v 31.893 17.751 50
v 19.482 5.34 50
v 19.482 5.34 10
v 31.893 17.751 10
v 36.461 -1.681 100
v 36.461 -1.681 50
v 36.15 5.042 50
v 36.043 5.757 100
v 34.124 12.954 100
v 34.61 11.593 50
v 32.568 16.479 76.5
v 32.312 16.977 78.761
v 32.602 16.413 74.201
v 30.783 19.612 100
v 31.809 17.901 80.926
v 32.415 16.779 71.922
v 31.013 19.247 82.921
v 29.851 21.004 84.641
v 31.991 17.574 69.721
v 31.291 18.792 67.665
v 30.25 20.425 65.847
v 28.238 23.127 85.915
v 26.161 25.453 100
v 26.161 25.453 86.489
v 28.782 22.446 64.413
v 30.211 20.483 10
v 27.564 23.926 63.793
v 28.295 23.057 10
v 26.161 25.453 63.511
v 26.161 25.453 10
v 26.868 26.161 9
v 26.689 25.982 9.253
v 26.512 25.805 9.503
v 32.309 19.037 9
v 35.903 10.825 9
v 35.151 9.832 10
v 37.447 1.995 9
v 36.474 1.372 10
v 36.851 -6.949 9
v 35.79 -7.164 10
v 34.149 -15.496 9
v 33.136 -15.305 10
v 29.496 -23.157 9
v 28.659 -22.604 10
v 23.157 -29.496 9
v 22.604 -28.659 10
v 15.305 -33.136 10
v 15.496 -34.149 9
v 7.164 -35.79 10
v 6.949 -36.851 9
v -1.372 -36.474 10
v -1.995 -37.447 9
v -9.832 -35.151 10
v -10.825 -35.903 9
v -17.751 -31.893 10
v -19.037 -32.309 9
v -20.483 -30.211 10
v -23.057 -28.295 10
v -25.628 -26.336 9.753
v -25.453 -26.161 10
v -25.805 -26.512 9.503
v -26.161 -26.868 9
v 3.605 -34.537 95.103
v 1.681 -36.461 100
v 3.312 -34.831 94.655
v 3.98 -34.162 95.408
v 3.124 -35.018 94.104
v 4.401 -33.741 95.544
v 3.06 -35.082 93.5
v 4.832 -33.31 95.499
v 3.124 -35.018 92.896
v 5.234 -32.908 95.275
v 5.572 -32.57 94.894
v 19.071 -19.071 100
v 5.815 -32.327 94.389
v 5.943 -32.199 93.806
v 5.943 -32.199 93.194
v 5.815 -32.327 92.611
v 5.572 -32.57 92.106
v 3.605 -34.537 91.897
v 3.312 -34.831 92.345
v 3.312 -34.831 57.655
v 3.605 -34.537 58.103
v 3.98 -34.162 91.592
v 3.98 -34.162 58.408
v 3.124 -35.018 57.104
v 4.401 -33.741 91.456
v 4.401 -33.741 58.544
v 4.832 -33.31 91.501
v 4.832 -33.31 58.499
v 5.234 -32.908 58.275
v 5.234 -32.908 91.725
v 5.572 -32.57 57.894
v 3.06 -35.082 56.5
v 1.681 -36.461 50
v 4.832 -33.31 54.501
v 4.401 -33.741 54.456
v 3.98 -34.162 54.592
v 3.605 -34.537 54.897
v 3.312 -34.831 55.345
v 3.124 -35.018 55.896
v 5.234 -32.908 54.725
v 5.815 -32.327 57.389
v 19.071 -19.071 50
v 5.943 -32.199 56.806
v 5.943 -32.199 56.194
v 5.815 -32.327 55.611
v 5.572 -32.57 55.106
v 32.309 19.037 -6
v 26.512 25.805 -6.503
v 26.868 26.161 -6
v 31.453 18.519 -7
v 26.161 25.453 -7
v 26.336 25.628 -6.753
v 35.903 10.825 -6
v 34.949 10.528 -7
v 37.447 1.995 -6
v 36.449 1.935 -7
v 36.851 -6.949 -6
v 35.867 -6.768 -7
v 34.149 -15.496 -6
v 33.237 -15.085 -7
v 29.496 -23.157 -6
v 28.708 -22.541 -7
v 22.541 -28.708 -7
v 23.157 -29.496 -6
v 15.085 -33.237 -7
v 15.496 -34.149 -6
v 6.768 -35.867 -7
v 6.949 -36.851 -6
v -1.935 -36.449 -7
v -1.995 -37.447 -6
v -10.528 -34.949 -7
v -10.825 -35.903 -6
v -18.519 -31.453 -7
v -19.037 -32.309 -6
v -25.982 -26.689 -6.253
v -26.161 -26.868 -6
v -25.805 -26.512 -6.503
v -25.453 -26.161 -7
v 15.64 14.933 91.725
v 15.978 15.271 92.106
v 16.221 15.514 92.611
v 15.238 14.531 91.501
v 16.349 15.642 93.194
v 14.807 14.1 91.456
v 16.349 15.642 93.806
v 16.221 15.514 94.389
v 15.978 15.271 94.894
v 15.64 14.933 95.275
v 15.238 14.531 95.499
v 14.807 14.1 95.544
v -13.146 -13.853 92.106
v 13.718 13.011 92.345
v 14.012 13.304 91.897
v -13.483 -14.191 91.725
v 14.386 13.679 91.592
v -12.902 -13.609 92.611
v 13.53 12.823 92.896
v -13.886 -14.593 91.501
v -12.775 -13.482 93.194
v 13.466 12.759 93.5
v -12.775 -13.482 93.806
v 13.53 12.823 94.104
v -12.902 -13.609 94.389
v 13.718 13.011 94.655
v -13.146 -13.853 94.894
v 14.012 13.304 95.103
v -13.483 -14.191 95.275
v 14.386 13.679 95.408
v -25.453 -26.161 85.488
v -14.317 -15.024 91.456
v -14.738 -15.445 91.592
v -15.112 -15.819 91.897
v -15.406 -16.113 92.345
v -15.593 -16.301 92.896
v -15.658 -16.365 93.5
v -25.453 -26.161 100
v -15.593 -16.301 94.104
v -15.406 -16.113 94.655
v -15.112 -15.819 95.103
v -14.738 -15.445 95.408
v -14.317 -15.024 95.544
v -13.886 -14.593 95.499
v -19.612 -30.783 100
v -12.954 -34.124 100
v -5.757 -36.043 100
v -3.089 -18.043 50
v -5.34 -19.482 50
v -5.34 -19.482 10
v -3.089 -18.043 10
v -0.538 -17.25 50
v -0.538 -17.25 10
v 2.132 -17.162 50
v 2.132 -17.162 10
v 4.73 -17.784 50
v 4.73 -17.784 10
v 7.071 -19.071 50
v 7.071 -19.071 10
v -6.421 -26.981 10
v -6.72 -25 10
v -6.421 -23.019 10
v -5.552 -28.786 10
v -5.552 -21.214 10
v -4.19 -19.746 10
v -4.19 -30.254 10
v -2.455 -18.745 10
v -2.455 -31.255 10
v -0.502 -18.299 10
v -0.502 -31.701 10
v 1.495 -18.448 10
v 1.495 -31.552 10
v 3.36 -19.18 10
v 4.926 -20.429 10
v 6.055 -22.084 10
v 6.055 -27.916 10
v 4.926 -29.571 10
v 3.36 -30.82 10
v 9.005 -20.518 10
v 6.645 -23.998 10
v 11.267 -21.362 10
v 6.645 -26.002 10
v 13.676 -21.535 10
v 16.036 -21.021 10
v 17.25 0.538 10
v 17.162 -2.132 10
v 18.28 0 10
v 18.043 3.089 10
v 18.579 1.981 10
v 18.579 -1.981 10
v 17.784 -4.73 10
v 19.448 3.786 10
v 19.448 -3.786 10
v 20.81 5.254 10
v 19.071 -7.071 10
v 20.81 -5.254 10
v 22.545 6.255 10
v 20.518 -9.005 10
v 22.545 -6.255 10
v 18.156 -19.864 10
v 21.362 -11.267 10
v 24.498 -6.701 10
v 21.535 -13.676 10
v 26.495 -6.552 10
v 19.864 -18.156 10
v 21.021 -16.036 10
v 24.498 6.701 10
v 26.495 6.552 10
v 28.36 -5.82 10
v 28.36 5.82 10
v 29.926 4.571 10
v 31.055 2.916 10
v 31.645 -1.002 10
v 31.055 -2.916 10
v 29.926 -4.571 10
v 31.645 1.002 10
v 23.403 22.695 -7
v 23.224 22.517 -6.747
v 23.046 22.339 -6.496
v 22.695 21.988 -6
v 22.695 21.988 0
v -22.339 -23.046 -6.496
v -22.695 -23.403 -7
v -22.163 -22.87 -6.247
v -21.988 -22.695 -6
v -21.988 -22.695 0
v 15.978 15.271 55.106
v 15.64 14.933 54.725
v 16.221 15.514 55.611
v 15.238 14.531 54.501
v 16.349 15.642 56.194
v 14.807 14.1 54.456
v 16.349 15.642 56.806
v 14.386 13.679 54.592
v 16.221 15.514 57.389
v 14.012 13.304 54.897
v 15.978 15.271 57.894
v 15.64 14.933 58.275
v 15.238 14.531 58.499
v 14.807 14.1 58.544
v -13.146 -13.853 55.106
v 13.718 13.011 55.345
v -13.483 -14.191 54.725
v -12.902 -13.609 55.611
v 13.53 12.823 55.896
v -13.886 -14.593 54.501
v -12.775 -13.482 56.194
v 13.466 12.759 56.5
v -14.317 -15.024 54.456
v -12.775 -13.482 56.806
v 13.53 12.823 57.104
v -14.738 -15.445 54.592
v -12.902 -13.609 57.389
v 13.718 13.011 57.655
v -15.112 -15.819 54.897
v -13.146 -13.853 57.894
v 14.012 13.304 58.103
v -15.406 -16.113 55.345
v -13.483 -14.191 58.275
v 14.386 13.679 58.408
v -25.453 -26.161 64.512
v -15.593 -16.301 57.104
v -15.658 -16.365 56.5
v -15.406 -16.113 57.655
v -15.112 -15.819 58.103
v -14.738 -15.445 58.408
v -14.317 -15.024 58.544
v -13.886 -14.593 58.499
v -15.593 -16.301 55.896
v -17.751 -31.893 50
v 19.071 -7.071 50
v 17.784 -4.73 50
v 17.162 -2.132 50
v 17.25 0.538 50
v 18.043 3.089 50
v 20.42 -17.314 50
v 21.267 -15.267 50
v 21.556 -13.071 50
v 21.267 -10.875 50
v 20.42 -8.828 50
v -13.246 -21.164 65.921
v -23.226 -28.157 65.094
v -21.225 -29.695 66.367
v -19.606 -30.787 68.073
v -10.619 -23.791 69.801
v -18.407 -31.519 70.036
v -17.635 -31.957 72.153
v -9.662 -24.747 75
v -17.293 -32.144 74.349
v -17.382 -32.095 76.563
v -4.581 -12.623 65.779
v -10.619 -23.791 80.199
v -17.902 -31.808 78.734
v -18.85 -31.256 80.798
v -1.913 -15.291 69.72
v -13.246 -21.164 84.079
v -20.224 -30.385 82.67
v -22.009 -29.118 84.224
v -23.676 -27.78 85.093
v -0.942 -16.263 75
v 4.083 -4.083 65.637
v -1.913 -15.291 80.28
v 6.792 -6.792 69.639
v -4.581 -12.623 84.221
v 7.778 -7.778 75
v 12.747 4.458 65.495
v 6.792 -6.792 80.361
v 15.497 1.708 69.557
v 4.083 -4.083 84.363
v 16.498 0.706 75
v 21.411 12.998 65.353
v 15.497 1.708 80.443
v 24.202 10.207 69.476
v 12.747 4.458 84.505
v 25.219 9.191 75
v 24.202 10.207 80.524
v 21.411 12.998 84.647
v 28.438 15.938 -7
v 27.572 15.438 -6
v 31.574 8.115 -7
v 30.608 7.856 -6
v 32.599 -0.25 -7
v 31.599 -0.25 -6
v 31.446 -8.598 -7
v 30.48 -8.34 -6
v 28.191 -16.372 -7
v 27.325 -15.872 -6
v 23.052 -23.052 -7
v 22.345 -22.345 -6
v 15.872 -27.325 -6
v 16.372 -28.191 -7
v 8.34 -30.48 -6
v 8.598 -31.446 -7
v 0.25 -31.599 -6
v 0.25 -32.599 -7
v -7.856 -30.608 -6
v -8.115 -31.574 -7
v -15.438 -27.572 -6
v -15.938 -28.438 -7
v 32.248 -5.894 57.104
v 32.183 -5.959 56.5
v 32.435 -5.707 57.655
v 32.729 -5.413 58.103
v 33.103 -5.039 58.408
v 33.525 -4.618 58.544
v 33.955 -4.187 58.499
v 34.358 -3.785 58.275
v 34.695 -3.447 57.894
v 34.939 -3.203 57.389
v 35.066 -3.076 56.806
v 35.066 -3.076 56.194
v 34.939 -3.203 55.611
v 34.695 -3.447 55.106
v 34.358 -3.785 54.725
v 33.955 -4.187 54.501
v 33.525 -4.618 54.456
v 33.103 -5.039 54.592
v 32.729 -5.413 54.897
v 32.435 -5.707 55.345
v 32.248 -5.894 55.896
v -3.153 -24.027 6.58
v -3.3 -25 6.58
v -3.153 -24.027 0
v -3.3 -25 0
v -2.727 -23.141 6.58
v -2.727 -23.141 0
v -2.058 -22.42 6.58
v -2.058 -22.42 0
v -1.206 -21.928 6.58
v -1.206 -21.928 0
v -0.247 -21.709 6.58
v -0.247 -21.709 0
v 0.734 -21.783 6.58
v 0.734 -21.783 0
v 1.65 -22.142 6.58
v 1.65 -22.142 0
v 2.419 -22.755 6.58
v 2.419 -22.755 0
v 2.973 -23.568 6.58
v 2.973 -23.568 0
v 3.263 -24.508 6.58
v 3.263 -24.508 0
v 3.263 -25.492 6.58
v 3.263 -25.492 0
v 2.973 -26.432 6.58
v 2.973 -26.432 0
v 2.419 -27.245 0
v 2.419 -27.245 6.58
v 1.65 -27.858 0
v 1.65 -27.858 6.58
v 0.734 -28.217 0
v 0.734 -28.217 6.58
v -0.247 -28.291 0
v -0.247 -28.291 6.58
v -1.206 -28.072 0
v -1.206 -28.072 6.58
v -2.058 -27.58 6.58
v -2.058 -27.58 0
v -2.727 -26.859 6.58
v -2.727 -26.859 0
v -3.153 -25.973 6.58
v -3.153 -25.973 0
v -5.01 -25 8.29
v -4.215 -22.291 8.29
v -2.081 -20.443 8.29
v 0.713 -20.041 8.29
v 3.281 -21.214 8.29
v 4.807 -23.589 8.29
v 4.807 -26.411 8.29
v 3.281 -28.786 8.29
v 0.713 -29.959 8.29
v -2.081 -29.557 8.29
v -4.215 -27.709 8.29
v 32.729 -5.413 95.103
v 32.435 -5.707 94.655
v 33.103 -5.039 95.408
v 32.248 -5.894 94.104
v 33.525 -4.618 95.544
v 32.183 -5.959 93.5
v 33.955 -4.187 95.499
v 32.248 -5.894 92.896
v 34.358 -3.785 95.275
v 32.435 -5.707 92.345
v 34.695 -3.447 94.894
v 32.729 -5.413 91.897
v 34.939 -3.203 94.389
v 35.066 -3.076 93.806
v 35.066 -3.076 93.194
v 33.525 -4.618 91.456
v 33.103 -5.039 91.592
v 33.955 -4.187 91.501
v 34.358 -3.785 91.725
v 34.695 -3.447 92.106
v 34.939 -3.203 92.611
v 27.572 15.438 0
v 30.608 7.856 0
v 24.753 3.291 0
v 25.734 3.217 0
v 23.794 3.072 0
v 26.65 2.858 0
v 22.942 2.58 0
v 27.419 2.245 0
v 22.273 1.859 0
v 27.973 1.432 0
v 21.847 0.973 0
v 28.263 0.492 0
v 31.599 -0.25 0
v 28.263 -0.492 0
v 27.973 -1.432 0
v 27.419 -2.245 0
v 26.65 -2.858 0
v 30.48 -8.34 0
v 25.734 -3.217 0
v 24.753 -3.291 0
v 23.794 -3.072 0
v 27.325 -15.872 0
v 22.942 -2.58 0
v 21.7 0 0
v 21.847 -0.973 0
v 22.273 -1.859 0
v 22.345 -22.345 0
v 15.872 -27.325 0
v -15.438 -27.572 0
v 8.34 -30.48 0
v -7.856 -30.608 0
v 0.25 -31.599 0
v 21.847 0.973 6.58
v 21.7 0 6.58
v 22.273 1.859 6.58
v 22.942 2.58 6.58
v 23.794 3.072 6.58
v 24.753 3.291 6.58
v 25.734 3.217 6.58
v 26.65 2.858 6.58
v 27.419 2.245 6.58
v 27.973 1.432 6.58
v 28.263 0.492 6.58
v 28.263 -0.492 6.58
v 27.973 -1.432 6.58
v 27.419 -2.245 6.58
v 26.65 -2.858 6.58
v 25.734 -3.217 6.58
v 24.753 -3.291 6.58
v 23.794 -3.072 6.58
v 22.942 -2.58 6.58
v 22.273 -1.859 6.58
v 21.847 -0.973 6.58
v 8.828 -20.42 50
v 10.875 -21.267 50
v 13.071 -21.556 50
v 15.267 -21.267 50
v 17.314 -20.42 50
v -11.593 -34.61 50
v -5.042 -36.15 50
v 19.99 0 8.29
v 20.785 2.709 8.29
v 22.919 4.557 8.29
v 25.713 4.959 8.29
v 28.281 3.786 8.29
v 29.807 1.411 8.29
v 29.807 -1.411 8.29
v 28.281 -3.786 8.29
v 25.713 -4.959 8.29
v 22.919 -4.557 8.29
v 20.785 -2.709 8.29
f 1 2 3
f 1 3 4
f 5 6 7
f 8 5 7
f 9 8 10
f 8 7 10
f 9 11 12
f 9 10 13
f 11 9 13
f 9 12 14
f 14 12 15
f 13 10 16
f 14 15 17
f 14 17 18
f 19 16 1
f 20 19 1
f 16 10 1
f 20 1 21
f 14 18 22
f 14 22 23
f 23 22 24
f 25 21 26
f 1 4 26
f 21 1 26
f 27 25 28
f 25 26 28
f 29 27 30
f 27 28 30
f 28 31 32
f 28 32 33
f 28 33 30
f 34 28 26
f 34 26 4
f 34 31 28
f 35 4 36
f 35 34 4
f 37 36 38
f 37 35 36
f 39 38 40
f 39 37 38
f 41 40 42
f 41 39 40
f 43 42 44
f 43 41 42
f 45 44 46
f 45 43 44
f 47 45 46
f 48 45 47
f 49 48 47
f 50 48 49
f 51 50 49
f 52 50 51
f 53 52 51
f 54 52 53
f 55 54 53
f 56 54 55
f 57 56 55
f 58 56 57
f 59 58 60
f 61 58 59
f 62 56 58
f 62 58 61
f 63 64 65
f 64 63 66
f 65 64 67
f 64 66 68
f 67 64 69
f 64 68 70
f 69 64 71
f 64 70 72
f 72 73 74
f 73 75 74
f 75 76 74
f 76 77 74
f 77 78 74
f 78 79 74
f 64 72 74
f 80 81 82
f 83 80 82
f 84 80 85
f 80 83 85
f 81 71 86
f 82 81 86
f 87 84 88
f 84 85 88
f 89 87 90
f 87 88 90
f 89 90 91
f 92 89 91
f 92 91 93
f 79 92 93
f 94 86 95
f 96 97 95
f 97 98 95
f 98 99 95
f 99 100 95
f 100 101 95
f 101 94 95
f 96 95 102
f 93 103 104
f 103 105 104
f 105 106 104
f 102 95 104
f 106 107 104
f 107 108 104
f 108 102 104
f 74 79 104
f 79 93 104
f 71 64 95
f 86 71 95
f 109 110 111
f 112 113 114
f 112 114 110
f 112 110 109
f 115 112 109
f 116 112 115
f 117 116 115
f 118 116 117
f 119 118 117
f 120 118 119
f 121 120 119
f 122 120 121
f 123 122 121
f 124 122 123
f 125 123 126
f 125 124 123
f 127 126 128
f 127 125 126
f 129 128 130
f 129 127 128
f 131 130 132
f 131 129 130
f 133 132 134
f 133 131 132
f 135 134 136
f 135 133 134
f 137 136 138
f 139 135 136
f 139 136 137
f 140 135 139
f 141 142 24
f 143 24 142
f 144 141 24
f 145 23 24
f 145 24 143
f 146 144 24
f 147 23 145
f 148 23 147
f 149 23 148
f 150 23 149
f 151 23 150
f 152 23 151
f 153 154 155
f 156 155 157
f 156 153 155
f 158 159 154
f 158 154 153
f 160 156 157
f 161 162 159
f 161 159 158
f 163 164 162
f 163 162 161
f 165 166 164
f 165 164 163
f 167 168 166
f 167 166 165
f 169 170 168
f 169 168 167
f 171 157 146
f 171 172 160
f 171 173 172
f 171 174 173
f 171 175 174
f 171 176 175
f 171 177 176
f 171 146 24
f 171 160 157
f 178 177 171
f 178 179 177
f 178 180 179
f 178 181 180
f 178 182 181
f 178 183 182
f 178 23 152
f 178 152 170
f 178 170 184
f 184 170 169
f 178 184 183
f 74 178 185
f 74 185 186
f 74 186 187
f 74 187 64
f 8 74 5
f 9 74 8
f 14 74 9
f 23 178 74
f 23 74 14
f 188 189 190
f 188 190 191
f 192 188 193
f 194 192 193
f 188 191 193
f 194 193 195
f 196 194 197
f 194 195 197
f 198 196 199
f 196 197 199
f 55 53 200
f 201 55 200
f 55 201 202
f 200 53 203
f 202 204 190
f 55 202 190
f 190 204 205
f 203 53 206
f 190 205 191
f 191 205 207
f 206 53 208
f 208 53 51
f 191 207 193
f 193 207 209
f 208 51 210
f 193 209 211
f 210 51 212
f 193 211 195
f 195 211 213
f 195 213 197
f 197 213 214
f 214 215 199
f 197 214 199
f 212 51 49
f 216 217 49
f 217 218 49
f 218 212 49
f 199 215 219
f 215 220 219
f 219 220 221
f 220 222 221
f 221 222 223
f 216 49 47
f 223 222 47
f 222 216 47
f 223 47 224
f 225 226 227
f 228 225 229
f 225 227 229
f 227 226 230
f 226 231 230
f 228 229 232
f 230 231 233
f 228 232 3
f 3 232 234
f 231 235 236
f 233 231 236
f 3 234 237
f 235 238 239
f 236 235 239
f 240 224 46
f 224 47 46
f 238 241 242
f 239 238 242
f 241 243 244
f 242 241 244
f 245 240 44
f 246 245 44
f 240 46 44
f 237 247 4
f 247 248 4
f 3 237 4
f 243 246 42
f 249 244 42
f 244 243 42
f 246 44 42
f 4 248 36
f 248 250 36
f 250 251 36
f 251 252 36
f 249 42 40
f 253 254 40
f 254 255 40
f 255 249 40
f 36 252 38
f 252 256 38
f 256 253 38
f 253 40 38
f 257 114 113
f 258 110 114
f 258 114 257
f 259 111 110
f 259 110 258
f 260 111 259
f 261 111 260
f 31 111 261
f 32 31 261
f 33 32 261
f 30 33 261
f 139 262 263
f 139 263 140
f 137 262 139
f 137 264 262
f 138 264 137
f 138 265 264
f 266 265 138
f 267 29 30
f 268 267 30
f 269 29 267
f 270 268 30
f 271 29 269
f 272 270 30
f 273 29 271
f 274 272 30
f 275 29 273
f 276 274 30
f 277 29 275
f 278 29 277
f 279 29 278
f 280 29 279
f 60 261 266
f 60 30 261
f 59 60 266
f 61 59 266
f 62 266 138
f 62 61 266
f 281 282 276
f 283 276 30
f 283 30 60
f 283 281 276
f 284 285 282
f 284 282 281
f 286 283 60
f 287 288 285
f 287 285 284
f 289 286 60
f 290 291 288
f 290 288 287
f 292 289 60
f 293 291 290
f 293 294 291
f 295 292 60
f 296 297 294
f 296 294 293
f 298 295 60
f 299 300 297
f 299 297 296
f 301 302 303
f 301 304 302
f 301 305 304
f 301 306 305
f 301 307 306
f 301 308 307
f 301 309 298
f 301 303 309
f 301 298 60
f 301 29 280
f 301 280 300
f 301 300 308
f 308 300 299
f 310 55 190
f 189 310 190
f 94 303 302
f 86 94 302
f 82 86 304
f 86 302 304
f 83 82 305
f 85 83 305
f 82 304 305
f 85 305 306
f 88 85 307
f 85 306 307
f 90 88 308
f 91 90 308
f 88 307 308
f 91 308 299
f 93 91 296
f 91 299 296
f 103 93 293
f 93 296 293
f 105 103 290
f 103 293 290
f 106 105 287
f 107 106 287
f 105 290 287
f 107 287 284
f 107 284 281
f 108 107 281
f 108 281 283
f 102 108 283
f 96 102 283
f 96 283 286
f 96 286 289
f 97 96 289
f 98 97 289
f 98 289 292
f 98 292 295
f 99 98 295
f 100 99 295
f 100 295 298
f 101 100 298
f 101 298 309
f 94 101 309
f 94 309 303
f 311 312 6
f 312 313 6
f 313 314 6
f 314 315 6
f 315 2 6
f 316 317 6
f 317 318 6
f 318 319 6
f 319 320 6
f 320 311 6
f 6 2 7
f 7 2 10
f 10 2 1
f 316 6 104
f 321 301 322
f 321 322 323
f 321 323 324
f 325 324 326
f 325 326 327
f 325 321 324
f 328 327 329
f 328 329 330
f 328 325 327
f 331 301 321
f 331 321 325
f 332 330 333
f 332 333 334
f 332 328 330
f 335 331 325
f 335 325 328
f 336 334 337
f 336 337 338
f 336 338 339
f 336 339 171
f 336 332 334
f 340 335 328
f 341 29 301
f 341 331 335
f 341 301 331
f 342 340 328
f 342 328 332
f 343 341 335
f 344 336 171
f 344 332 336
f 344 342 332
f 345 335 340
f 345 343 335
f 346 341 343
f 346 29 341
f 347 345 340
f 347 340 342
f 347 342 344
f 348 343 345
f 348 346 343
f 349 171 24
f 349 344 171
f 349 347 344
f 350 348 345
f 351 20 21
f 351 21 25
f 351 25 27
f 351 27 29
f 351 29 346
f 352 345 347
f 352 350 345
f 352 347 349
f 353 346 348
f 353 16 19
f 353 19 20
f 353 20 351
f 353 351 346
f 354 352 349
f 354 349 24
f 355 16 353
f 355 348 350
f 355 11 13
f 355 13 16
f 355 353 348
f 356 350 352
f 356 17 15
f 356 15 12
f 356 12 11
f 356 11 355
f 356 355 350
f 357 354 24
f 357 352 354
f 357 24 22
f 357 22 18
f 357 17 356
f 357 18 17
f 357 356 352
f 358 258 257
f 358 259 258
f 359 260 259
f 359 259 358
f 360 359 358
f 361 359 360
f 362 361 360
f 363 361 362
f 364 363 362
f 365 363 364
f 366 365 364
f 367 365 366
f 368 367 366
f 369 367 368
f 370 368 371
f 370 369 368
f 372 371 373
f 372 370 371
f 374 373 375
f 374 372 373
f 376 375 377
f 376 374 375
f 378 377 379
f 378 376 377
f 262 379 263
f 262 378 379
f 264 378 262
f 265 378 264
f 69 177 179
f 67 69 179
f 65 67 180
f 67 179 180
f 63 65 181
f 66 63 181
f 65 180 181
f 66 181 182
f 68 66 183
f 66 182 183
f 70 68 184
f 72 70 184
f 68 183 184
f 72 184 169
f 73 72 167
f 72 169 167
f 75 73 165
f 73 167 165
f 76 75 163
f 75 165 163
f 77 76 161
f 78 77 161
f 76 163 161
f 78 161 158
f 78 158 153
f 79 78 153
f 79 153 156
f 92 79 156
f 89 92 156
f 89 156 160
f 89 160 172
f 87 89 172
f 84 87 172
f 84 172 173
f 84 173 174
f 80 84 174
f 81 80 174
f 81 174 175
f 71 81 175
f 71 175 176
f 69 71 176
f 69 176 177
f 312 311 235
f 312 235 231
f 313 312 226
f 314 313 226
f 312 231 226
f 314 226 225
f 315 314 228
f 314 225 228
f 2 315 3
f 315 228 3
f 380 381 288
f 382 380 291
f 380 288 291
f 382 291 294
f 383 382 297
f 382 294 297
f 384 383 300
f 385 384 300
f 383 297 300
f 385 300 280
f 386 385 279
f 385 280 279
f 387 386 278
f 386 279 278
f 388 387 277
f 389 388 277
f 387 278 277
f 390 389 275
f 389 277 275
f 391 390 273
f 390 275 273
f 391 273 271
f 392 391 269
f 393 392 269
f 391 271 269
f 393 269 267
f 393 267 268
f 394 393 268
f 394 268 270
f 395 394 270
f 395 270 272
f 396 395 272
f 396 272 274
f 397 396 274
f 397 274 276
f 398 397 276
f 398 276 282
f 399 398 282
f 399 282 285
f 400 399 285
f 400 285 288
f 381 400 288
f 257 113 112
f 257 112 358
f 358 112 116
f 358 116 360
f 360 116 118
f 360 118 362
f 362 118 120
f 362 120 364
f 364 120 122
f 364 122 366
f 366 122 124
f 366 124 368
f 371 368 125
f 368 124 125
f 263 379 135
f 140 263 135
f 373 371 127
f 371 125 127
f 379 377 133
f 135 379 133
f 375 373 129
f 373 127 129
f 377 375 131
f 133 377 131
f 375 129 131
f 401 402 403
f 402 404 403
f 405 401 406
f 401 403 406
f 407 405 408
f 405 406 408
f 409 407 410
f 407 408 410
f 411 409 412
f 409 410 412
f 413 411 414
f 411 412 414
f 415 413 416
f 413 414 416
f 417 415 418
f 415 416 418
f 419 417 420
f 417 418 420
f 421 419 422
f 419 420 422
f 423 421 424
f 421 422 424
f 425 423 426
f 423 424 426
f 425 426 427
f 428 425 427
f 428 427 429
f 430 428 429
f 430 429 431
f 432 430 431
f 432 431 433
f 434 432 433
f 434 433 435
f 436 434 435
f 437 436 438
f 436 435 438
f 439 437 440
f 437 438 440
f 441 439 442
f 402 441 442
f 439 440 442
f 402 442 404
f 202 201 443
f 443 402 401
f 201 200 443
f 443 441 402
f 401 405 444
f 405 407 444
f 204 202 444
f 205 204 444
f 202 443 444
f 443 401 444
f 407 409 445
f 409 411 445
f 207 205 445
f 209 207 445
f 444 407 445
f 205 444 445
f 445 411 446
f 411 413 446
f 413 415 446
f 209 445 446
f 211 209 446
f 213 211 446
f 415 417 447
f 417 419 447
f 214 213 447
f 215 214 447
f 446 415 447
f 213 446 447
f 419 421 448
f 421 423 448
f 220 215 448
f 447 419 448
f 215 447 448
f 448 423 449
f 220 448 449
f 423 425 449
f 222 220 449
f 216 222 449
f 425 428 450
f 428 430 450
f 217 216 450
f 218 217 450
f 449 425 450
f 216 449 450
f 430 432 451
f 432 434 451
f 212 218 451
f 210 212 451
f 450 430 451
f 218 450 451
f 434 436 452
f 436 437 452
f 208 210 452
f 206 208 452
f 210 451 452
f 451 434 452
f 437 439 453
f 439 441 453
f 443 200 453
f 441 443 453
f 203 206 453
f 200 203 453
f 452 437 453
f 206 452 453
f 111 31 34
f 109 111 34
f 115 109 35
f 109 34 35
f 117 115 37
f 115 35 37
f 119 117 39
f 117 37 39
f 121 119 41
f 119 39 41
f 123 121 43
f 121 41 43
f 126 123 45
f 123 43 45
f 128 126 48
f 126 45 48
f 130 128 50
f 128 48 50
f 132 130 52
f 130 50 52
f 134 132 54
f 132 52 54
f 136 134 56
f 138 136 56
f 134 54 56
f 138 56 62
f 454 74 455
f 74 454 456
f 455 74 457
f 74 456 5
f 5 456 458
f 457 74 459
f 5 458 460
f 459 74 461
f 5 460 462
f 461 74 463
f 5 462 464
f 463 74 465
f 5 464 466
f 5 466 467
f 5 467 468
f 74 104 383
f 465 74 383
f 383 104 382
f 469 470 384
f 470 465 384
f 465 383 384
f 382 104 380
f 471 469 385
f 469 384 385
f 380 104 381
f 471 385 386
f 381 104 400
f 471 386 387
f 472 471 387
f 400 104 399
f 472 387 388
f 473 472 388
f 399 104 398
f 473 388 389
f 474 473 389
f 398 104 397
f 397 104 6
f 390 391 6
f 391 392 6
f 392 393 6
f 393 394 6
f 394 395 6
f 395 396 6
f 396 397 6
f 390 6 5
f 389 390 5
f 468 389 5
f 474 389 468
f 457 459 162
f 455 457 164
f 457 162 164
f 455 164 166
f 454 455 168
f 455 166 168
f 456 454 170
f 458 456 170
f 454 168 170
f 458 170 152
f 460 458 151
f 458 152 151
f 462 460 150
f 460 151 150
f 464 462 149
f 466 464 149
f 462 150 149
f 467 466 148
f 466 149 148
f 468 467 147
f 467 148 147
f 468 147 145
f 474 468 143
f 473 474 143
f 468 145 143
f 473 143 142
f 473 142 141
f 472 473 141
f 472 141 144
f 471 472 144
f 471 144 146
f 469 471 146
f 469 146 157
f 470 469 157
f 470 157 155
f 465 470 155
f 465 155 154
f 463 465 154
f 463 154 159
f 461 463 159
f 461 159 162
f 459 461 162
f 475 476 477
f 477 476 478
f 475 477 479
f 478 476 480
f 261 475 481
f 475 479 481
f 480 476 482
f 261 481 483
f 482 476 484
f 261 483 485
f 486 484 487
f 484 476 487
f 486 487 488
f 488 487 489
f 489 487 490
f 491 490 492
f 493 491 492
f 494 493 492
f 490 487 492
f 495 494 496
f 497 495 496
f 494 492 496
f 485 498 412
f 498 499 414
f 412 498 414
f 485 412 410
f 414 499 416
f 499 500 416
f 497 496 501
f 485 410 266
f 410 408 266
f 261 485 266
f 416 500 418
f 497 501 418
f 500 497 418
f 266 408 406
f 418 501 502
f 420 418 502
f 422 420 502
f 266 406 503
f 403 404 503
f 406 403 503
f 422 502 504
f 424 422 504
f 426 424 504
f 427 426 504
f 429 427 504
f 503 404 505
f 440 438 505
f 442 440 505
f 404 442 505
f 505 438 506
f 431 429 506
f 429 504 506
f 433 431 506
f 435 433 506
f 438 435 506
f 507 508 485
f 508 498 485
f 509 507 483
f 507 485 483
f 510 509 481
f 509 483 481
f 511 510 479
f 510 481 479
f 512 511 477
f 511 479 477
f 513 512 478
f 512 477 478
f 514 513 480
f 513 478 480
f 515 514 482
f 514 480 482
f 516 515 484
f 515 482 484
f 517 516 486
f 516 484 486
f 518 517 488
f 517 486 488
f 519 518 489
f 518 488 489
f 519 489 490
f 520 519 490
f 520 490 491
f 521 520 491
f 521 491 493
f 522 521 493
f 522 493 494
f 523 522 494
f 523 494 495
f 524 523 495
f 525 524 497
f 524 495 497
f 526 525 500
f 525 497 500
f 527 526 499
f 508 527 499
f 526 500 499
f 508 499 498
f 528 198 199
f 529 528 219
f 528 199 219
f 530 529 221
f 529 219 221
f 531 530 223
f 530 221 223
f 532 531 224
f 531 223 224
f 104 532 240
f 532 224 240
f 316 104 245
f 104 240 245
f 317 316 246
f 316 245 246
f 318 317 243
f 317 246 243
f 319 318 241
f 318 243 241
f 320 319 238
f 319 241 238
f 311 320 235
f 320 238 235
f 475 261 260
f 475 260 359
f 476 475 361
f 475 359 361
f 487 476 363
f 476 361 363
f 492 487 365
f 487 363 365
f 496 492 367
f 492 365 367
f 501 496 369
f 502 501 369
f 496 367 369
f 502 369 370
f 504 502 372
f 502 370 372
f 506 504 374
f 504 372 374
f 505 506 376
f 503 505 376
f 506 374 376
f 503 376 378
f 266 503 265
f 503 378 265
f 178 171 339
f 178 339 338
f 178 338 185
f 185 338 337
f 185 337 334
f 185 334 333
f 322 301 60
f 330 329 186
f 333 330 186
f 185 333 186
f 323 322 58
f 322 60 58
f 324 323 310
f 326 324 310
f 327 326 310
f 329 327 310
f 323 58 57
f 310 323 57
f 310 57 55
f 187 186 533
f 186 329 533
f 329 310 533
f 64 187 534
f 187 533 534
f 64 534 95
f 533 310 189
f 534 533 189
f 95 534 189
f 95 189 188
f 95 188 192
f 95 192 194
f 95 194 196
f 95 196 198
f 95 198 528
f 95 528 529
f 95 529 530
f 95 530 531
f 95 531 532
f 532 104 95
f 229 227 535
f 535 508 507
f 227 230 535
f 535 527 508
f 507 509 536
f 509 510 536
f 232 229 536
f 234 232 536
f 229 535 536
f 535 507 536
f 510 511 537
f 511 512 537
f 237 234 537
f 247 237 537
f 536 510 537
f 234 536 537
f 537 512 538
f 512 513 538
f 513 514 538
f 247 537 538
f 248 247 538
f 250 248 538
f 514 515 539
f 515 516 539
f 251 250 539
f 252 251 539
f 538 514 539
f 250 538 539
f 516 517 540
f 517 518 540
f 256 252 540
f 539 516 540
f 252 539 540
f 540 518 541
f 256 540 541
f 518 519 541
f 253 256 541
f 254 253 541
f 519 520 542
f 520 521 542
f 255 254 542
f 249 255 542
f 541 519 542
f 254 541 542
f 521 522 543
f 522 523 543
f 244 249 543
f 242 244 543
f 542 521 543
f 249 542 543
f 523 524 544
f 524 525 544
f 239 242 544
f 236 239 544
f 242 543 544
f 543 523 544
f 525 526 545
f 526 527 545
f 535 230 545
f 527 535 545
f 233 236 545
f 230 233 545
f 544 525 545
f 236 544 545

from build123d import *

# Parameters (mm, degrees)
F1_ANGLE_BACK  = 45
F1_ANGLE       = 180
F2_SIZE        = 1
F4_D           = 6.6
F4_CSINK_D     = 13.44
F4_CSINK_ANGLE = 90
F6_DEPTH       = 40
F8_DEPTH       = 50
F12_D          = 4.1
F13_W          = 100.6186008453
F13_H          = 151.657152921
F14_DEPTH      = 0.5


# Not quite as in the source:
# - a feature names something its author has since deleted; it is built from what else it names


with BuildPart() as f1:
    # F0 (on Front) → F1 (revolve)
    with BuildSketch(Plane.XZ, mode=Mode.PRIVATE) as f1_sk:
        Polygon((0, 10), (0, 0), (31.6, 0), (31.6, -7), (37.5, -7), (37.5, 10), align=None)
    revolve(f1_sk.sketch.rotate(Axis((0, 0, 5), (0, 0, -1)), -F1_ANGLE_BACK), axis=Axis((0, 0, 5), (0, 0, -1)), revolution_arc=F1_ANGLE)

    # F2
    f2_edges = [f1.edges().sort_by_distance(p)[0] for p in [
        (22.344574, -22.344574, -7),
        (26.516504, -26.516504, -7),
        (26.516504, -26.516504, 10),
    ]]
    chamfer(f2_edges, length=F2_SIZE)

    # F4 (through all)
    with Locations(Plane.XY.offset(10)):
        with Locations((25, 0), (0, -25)):
            CounterSinkHole(F4_D / 2, F4_CSINK_D / 2, counter_sink_angle=F4_CSINK_ANGLE)

    # F5 (on face) → F6 (join)
    with BuildSketch(Plane.XY.offset(10)):
        with BuildLine():
            Line((19.4820004924, 5.3398648686), (7.0710678119, -7.0710678119))
            Line((7.0710678119, -7.0710678119), (-5.3398648686, -19.4820004924))
            ThreePointArc((-5.3398648686, -19.4820004924), (0.79408889, -17.1167209324), (7.0710678119, -19.0710678119))
            ThreePointArc((7.0710678119, -19.0710678119), (19.0710678119, -19.0710678119), (19.0710678119, -7.0710678119))
            ThreePointArc((19.0710678119, -7.0710678119), (17.1167209324, -0.79408889), (19.4820004924, 5.3398648686))
        make_face()
        with BuildLine():
            Line((7.0710678119, -7.0710678119), (0, 0))
            Line((0, 0), (-25.8093975133, -25.8093975133))
            ThreePointArc((-25.8093975133, -25.8093975133), (-21.9914756212, -29.1311688746), (-17.7507975491, -31.8929331729))
            Line((-17.7507975491, -31.8929331729), (-5.3398648686, -19.4820004924))
            Line((-5.3398648686, -19.4820004924), (7.0710678119, -7.0710678119))
        make_face()
        with BuildLine():
            Line((25.8093975133, 25.8093975133), (0, 0))
            Line((0, 0), (7.0710678119, -7.0710678119))
            Line((7.0710678119, -7.0710678119), (19.4820004924, 5.3398648686))
            Line((19.4820004924, 5.3398648686), (31.8929331729, 17.7507975491))
            ThreePointArc((31.8929331729, 17.7507975491), (29.1311688746, 21.9914756212), (25.8093975133, 25.8093975133))
        make_face()
    extrude(amount=F6_DEPTH)

    # F7 (on face) → F8 (join)
    with BuildSketch(Plane.XY.offset(50)):
        with BuildLine():
            ThreePointArc((36.4612769111, -1.6808587126), (35.531279534, 8.3533331479), (31.8929331729, 17.7507975491))
            Line((31.8929331729, 17.7507975491), (19.4820004924, 5.3398648686))
            ThreePointArc((19.4820004924, 5.3398648686), (17.1167209324, -0.79408889), (19.0710678119, -7.0710678119))
            ThreePointArc((19.0710678119, -7.0710678119), (21.5563491861, -13.0710678119), (19.0710678119, -19.0710678119))
            Line((19.0710678119, -19.0710678119), (36.4612769111, -1.6808587126))
        make_face()
        with BuildLine():
            Line((-5.3398648686, -19.4820004924), (-17.7507975491, -31.8929331729))
            ThreePointArc((-17.7507975491, -31.8929331729), (-8.3533331479, -35.531279534), (1.6808587126, -36.4612769111))
            Line((1.6808587126, -36.4612769111), (19.0710678119, -19.0710678119))
            ThreePointArc((19.0710678119, -19.0710678119), (13.0710678119, -21.5563491861), (7.0710678119, -19.0710678119))
            ThreePointArc((7.0710678119, -19.0710678119), (0.79408889, -17.1167209324), (-5.3398648686, -19.4820004924))
        make_face()
        with BuildLine():
            ThreePointArc((31.8929331729, 17.7507975491), (29.1311688746, 21.9914756212), (25.8093975133, 25.8093975133))
            Line((25.8093975133, 25.8093975133), (-25.8093975133, -25.8093975133))
            ThreePointArc((-25.8093975133, -25.8093975133), (-21.9914756212, -29.1311688746), (-17.7507975491, -31.8929331729))
            Line((-17.7507975491, -31.8929331729), (-5.3398648686, -19.4820004924))
            ThreePointArc((-5.3398648686, -19.4820004924), (0.79408889, -17.1167209324), (7.0710678119, -19.0710678119))
            ThreePointArc((7.0710678119, -19.0710678119), (13.0710678119, -21.5563491861), (19.0710678119, -19.0710678119))
            ThreePointArc((19.0710678119, -19.0710678119), (21.5563491861, -13.0710678119), (19.0710678119, -7.0710678119))
            ThreePointArc((19.0710678119, -7.0710678119), (17.1167209324, -0.79408889), (19.4820004924, 5.3398648686))
            Line((19.4820004924, 5.3398648686), (31.8929331729, 17.7507975491))
        make_face()
    extrude(amount=F8_DEPTH)

    # F9 (on face) → F10 (revolve, cut)
    with BuildSketch(Plane(origin=(0, 0, 0), x_dir=(-0.7071067812, -0.7071067812, 0), z_dir=(-0.7071067812, 0.7071067812, 0))):
        Polygon((36.5, 85.5), (-36.5, 86.5), (-36.5, 75), (36.5, 75), align=None)
    revolve(axis=Axis((0, 0, 75), (-0.7071067812, -0.7071067812, 0)), mode=Mode.SUBTRACT)

    # F12 (through all)
    with Locations(Plane(origin=(19.0710678119, -19.0710678119, 0), x_dir=(0.7071067812, 0.7071067812, 0), z_dir=(0.7071067812, -0.7071067812, 0))):
        with Locations((20.5934695606, 93.5), (20.5934695606, 56.5), (-20.5934695606, 56.5), (-20.5934695606, 93.5)):
            Hole(F12_D / 2)

    # F13 (on face) → F14 (cut)
    with BuildSketch(Plane(origin=(0, 0, 0), x_dir=(-0.7071067812, -0.7071067812, 0), z_dir=(-0.7071067812, 0.7071067812, 0))):
        with Locations((-1.9399225712, 37.7359148115)):
            Rectangle(F13_W, F13_H)
    extrude(amount=-F14_DEPTH, mode=Mode.SUBTRACT)


solid = f1.part
